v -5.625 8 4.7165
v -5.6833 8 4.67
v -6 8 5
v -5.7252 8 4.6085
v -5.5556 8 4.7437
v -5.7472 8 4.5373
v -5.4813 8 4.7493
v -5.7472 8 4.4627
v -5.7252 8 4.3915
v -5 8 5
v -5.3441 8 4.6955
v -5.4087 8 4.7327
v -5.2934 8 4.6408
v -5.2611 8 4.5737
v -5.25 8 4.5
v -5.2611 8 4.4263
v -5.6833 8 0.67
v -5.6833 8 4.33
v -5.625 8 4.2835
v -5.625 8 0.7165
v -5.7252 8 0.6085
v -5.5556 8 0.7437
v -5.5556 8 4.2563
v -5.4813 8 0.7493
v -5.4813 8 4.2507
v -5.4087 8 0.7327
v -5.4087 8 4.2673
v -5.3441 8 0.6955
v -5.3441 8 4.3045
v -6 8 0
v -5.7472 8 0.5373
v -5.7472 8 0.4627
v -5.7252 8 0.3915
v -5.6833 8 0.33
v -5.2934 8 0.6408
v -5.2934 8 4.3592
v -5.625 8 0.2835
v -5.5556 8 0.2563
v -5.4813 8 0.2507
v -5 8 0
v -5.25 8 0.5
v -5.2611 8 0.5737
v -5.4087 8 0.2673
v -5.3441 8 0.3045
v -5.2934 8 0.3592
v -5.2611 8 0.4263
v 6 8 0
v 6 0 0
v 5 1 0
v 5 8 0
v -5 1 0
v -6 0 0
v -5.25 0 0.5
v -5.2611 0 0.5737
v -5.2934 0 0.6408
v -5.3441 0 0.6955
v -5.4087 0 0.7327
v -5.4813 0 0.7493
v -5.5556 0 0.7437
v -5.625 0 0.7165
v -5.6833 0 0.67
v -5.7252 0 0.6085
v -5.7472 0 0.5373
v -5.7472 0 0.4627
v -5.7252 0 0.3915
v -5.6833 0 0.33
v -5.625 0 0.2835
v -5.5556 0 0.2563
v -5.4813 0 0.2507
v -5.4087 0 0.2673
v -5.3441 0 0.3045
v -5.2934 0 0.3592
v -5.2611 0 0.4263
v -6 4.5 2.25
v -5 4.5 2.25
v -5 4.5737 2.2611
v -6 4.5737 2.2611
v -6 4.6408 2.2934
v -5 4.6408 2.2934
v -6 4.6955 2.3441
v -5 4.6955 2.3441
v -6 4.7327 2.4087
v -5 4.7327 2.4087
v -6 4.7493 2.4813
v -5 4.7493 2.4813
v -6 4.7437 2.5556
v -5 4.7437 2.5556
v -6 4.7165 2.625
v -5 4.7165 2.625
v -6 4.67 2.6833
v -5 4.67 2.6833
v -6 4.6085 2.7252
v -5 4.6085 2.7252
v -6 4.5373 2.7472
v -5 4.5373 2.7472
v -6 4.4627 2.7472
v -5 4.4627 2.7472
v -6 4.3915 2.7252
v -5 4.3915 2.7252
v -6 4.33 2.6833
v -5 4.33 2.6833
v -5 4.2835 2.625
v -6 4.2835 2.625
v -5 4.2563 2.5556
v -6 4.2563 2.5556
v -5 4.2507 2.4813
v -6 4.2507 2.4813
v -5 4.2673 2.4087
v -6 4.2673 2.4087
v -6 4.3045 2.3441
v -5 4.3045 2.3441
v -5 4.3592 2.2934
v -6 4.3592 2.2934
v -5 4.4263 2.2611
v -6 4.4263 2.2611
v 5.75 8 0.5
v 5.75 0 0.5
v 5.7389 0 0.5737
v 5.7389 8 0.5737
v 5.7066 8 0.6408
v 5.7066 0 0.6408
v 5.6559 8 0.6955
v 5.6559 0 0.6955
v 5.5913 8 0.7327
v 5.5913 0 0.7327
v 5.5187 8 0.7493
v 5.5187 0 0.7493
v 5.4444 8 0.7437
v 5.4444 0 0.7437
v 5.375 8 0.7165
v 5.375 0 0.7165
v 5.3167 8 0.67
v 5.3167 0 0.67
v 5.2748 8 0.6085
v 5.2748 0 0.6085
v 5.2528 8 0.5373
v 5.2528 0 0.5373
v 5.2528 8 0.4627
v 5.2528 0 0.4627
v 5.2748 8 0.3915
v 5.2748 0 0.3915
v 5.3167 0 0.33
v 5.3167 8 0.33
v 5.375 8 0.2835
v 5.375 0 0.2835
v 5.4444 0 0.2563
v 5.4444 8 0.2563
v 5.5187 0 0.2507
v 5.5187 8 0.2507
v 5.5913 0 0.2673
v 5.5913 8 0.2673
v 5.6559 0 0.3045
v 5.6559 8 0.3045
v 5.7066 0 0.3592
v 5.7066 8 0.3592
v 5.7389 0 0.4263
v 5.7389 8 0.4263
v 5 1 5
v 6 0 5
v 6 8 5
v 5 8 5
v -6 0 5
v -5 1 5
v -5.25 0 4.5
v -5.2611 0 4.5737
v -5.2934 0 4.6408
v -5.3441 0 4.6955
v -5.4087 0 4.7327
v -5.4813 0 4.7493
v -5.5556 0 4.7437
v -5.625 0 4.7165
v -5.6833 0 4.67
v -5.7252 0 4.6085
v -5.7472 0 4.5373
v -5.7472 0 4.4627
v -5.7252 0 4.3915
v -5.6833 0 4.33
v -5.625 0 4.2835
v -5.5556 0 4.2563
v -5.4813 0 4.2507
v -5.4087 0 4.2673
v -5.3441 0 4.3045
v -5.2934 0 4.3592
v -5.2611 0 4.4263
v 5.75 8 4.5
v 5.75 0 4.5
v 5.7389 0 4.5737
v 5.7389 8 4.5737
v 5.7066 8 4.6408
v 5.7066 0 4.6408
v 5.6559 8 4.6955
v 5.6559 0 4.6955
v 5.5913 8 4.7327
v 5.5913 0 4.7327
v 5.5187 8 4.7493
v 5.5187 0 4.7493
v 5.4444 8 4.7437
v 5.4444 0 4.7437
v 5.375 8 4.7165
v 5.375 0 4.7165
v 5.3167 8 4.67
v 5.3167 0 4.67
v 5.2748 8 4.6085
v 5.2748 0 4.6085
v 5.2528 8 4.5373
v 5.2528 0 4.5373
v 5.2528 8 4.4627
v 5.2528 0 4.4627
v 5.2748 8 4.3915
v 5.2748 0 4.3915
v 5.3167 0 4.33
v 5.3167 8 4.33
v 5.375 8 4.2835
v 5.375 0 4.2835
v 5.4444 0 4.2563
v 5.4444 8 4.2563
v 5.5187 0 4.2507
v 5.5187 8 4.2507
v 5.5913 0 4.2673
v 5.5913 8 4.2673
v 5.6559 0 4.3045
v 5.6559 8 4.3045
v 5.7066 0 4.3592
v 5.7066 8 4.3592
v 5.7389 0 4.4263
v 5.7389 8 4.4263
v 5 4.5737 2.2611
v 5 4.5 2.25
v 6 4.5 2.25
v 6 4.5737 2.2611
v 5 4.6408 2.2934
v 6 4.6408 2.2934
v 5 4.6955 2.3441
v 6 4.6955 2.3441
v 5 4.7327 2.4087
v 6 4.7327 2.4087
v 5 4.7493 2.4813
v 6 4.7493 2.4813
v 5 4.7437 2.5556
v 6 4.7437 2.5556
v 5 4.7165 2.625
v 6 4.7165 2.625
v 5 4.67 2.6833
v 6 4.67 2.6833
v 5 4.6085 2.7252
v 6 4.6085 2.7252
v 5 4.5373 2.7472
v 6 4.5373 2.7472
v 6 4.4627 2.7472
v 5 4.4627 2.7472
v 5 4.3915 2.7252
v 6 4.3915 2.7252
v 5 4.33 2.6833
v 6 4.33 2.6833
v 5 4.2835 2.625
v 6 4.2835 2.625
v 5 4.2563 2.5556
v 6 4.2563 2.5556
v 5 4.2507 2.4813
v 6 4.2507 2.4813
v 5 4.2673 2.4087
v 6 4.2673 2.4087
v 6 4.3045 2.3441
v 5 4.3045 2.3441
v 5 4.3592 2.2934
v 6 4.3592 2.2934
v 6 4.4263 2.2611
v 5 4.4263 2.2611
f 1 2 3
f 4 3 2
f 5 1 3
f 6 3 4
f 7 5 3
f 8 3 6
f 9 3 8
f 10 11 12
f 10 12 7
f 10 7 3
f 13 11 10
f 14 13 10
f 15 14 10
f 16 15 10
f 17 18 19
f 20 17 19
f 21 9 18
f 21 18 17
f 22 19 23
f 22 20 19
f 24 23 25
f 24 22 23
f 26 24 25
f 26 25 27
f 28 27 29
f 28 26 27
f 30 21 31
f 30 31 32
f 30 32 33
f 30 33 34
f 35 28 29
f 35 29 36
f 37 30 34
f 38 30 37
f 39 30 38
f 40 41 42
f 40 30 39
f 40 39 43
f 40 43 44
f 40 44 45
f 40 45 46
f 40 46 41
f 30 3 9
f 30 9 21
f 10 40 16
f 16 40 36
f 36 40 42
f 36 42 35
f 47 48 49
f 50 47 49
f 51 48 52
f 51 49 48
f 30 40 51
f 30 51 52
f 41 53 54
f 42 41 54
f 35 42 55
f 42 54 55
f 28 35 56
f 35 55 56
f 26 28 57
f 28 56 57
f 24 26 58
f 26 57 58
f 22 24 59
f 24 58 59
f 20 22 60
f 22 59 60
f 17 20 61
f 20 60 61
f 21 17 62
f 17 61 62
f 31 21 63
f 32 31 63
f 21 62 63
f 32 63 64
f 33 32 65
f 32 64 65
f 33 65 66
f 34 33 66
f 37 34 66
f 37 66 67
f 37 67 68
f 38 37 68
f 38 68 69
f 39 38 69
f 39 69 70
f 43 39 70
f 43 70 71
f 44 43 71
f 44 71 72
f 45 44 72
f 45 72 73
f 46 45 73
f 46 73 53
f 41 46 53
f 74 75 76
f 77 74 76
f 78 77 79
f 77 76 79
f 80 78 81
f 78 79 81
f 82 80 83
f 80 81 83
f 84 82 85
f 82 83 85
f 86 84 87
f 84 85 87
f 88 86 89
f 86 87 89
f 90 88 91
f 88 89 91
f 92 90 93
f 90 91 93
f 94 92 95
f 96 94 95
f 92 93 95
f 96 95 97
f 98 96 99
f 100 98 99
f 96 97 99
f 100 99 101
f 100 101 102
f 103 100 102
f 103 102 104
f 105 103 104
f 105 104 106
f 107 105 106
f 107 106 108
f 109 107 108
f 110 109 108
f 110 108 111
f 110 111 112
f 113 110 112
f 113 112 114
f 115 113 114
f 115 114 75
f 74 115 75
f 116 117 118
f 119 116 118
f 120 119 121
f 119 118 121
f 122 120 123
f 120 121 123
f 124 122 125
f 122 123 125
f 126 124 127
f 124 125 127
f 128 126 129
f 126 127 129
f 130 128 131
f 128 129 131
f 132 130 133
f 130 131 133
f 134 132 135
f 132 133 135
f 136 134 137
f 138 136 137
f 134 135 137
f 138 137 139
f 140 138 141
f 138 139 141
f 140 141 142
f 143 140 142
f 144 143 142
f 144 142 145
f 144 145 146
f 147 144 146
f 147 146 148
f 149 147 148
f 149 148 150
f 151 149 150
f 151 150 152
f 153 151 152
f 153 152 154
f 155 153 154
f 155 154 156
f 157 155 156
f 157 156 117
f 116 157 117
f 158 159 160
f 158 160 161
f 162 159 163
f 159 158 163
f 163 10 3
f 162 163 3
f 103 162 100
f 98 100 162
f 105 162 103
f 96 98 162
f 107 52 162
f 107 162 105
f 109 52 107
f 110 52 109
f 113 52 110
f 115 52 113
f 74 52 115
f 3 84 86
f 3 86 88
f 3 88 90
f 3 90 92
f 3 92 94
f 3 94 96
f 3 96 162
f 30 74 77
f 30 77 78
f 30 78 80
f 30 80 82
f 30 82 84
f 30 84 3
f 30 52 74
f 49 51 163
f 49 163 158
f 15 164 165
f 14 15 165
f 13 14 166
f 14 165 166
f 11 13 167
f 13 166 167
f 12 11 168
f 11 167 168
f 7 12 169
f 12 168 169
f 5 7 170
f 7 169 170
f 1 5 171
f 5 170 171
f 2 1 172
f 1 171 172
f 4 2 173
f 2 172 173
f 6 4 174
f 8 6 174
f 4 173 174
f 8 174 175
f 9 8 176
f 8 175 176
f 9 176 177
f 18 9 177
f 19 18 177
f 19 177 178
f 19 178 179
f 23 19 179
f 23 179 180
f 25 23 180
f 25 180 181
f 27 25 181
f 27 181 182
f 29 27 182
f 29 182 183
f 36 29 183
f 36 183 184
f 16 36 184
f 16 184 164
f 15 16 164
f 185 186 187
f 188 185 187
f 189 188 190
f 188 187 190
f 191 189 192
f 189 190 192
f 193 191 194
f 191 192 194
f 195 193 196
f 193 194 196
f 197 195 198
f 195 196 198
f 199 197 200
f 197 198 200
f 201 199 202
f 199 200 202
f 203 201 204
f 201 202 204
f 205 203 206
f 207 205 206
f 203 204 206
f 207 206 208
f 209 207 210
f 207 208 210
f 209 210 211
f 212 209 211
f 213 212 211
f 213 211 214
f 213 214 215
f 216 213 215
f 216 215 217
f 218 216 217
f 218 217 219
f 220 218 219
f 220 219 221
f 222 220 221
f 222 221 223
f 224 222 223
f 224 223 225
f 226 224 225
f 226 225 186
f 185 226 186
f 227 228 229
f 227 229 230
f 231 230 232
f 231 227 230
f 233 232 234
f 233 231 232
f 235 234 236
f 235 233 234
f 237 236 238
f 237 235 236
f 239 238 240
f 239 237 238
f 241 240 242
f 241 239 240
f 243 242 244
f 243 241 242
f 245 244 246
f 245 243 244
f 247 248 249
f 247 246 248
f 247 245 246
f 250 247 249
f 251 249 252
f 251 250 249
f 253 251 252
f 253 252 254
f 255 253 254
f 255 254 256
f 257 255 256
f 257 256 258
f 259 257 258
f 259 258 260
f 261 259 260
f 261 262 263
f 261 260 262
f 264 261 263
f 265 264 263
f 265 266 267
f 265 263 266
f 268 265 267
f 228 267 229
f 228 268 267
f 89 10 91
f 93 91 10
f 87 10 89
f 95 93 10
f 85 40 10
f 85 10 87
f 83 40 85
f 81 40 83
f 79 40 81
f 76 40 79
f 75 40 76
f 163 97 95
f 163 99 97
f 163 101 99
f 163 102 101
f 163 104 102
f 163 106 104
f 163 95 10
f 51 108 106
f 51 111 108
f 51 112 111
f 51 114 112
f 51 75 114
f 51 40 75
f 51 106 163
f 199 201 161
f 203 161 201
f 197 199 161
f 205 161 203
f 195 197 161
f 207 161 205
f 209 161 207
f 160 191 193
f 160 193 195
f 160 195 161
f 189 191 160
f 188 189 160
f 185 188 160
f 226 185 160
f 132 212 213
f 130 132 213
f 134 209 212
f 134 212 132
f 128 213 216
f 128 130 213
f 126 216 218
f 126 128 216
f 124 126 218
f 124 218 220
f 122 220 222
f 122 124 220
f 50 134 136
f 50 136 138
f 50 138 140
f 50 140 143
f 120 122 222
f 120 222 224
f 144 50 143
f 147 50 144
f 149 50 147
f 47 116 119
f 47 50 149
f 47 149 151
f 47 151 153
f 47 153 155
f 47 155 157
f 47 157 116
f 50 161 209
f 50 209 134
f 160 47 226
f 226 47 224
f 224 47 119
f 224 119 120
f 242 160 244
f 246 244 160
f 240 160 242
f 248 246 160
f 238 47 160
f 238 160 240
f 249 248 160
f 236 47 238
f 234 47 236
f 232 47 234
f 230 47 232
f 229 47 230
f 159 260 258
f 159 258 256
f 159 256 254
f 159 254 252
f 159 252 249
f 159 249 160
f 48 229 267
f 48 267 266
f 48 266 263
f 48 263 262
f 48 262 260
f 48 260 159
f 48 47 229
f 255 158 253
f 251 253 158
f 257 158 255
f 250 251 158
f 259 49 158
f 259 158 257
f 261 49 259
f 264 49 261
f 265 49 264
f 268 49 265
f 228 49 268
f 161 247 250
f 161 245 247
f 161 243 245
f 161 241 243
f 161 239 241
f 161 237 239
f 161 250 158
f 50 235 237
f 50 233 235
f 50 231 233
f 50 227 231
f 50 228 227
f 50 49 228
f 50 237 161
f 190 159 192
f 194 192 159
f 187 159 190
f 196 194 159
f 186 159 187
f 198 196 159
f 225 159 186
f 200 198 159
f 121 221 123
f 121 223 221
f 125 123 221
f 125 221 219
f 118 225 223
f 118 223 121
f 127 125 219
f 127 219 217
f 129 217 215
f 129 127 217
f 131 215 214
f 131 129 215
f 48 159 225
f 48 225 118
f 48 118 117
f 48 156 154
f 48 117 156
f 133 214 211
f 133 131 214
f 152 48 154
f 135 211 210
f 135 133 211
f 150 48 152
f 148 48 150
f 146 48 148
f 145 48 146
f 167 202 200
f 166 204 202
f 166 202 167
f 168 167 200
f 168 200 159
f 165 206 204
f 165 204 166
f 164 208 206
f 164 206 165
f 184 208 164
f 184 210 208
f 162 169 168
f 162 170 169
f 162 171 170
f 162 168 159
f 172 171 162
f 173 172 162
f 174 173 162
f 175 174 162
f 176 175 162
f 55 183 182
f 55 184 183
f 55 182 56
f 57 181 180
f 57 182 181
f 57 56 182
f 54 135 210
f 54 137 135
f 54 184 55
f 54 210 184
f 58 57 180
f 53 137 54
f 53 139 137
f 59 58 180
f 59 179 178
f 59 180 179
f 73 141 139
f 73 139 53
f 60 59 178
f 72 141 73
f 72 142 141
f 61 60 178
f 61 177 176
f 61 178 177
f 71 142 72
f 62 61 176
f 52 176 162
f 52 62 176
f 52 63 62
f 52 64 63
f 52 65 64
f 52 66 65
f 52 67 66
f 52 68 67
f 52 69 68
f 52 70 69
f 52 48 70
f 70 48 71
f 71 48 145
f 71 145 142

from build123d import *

# Parameters (mm, degrees)
BOSS_EXTRUDE1_DEPTH     = 5
SKETCH2_R               = 0.25
CUT_EXTRUDE1_DEPTH      = 9
SKETCH4_R               = 0.25
CUT_EXTRUDE2_DEPTH      = 10
CUT_EXTRUDE2_DEPTH_BACK = 10


with BuildPart() as part:
    # Sketch1 → Boss-Extrude1 (new body)
    with BuildSketch(Plane.XY):
        Polygon((-6, 8), (-5, 8), (-5, 1), (5, 1), (5, 8), (6, 8), (6, 0), (-6, 0), align=None)
    extrude(amount=BOSS_EXTRUDE1_DEPTH)

    # Sketch2 → Cut-Extrude1 (cut, through all)
    with BuildSketch(Plane.XZ):
        with Locations((-5.5, 4.5)):
            Circle(SKETCH2_R)
        with Locations((-5.5, 0.5)):
            Circle(SKETCH2_R)
        with Locations((5.5, 4.5)):
            Circle(SKETCH2_R)
        with Locations((5.5, 0.5)):
            Circle(SKETCH2_R)
    extrude(amount=-CUT_EXTRUDE1_DEPTH, mode=Mode.SUBTRACT)

    # Sketch4 → Cut-Extrude2 (cut, two sides)
    with BuildSketch(Plane(origin=(0, 0, 0), x_dir=(0, 0, -1), z_dir=(1, 0, 0))) as cut_extrude2_sk:
        with Locations((-2.5, 4.5)):
            Circle(SKETCH4_R)
    extrude(amount=CUT_EXTRUDE2_DEPTH, mode=Mode.SUBTRACT)
    extrude(cut_extrude2_sk.sketch, amount=-CUT_EXTRUDE2_DEPTH_BACK, mode=Mode.SUBTRACT)


solid = part.part
